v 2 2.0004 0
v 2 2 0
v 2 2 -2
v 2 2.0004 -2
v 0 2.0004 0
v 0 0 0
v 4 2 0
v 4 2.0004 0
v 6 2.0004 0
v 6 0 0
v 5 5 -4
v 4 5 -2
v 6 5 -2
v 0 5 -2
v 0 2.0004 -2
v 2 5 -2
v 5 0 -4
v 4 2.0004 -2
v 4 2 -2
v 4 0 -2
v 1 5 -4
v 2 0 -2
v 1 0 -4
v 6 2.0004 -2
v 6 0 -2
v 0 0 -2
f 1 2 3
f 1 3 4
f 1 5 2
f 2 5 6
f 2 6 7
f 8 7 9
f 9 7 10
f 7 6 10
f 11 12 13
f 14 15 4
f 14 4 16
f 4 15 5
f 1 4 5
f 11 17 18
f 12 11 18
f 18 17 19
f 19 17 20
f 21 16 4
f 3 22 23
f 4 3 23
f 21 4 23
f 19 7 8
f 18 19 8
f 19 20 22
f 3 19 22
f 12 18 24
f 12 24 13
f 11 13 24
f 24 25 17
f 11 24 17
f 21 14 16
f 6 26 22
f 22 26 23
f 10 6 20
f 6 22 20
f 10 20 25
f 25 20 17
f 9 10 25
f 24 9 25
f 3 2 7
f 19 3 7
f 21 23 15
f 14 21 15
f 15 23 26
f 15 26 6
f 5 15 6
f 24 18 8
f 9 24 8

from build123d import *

# Parameters (mm, degrees)
BOSS_EXTRUDE1_DEPTH = 5
SKETCH2_W           = 2
SKETCH2_H           = 3
CUT_EXTRUDE1_DEPTH  = 5
SKETCH3_W           = 2
SKETCH3_H           = 2.999556198
CUT_EXTRUDE2_DEPTH  = 15


with BuildPart() as part:
    # Sketch1 → Boss-Extrude1 (new body)
    with BuildSketch(Plane(origin=(0, 0, 0), x_dir=(1, 0, 0), z_dir=(0, 1, 0))):
        Polygon((0, 0), (6, 0), (6, 2), (5, 4), (4, 2), (2, 2), (1, 4), (0, 2), align=None)
    extrude(amount=BOSS_EXTRUDE1_DEPTH)

    # Sketch2 → Cut-Extrude1 (cut)
    with BuildSketch(Plane.XY):
        with Locations((3, 3.5)):
            Rectangle(SKETCH2_W, SKETCH2_H)
    extrude(amount=-CUT_EXTRUDE1_DEPTH, mode=Mode.SUBTRACT)

    # Sketch3 → Cut-Extrude2 (cut)
    with BuildSketch(Plane.ZY):
        with Locations((-1, 3.500221901)):
            Rectangle(SKETCH3_W, SKETCH3_H)
    extrude(amount=-CUT_EXTRUDE2_DEPTH, mode=Mode.SUBTRACT)


solid = part.part
